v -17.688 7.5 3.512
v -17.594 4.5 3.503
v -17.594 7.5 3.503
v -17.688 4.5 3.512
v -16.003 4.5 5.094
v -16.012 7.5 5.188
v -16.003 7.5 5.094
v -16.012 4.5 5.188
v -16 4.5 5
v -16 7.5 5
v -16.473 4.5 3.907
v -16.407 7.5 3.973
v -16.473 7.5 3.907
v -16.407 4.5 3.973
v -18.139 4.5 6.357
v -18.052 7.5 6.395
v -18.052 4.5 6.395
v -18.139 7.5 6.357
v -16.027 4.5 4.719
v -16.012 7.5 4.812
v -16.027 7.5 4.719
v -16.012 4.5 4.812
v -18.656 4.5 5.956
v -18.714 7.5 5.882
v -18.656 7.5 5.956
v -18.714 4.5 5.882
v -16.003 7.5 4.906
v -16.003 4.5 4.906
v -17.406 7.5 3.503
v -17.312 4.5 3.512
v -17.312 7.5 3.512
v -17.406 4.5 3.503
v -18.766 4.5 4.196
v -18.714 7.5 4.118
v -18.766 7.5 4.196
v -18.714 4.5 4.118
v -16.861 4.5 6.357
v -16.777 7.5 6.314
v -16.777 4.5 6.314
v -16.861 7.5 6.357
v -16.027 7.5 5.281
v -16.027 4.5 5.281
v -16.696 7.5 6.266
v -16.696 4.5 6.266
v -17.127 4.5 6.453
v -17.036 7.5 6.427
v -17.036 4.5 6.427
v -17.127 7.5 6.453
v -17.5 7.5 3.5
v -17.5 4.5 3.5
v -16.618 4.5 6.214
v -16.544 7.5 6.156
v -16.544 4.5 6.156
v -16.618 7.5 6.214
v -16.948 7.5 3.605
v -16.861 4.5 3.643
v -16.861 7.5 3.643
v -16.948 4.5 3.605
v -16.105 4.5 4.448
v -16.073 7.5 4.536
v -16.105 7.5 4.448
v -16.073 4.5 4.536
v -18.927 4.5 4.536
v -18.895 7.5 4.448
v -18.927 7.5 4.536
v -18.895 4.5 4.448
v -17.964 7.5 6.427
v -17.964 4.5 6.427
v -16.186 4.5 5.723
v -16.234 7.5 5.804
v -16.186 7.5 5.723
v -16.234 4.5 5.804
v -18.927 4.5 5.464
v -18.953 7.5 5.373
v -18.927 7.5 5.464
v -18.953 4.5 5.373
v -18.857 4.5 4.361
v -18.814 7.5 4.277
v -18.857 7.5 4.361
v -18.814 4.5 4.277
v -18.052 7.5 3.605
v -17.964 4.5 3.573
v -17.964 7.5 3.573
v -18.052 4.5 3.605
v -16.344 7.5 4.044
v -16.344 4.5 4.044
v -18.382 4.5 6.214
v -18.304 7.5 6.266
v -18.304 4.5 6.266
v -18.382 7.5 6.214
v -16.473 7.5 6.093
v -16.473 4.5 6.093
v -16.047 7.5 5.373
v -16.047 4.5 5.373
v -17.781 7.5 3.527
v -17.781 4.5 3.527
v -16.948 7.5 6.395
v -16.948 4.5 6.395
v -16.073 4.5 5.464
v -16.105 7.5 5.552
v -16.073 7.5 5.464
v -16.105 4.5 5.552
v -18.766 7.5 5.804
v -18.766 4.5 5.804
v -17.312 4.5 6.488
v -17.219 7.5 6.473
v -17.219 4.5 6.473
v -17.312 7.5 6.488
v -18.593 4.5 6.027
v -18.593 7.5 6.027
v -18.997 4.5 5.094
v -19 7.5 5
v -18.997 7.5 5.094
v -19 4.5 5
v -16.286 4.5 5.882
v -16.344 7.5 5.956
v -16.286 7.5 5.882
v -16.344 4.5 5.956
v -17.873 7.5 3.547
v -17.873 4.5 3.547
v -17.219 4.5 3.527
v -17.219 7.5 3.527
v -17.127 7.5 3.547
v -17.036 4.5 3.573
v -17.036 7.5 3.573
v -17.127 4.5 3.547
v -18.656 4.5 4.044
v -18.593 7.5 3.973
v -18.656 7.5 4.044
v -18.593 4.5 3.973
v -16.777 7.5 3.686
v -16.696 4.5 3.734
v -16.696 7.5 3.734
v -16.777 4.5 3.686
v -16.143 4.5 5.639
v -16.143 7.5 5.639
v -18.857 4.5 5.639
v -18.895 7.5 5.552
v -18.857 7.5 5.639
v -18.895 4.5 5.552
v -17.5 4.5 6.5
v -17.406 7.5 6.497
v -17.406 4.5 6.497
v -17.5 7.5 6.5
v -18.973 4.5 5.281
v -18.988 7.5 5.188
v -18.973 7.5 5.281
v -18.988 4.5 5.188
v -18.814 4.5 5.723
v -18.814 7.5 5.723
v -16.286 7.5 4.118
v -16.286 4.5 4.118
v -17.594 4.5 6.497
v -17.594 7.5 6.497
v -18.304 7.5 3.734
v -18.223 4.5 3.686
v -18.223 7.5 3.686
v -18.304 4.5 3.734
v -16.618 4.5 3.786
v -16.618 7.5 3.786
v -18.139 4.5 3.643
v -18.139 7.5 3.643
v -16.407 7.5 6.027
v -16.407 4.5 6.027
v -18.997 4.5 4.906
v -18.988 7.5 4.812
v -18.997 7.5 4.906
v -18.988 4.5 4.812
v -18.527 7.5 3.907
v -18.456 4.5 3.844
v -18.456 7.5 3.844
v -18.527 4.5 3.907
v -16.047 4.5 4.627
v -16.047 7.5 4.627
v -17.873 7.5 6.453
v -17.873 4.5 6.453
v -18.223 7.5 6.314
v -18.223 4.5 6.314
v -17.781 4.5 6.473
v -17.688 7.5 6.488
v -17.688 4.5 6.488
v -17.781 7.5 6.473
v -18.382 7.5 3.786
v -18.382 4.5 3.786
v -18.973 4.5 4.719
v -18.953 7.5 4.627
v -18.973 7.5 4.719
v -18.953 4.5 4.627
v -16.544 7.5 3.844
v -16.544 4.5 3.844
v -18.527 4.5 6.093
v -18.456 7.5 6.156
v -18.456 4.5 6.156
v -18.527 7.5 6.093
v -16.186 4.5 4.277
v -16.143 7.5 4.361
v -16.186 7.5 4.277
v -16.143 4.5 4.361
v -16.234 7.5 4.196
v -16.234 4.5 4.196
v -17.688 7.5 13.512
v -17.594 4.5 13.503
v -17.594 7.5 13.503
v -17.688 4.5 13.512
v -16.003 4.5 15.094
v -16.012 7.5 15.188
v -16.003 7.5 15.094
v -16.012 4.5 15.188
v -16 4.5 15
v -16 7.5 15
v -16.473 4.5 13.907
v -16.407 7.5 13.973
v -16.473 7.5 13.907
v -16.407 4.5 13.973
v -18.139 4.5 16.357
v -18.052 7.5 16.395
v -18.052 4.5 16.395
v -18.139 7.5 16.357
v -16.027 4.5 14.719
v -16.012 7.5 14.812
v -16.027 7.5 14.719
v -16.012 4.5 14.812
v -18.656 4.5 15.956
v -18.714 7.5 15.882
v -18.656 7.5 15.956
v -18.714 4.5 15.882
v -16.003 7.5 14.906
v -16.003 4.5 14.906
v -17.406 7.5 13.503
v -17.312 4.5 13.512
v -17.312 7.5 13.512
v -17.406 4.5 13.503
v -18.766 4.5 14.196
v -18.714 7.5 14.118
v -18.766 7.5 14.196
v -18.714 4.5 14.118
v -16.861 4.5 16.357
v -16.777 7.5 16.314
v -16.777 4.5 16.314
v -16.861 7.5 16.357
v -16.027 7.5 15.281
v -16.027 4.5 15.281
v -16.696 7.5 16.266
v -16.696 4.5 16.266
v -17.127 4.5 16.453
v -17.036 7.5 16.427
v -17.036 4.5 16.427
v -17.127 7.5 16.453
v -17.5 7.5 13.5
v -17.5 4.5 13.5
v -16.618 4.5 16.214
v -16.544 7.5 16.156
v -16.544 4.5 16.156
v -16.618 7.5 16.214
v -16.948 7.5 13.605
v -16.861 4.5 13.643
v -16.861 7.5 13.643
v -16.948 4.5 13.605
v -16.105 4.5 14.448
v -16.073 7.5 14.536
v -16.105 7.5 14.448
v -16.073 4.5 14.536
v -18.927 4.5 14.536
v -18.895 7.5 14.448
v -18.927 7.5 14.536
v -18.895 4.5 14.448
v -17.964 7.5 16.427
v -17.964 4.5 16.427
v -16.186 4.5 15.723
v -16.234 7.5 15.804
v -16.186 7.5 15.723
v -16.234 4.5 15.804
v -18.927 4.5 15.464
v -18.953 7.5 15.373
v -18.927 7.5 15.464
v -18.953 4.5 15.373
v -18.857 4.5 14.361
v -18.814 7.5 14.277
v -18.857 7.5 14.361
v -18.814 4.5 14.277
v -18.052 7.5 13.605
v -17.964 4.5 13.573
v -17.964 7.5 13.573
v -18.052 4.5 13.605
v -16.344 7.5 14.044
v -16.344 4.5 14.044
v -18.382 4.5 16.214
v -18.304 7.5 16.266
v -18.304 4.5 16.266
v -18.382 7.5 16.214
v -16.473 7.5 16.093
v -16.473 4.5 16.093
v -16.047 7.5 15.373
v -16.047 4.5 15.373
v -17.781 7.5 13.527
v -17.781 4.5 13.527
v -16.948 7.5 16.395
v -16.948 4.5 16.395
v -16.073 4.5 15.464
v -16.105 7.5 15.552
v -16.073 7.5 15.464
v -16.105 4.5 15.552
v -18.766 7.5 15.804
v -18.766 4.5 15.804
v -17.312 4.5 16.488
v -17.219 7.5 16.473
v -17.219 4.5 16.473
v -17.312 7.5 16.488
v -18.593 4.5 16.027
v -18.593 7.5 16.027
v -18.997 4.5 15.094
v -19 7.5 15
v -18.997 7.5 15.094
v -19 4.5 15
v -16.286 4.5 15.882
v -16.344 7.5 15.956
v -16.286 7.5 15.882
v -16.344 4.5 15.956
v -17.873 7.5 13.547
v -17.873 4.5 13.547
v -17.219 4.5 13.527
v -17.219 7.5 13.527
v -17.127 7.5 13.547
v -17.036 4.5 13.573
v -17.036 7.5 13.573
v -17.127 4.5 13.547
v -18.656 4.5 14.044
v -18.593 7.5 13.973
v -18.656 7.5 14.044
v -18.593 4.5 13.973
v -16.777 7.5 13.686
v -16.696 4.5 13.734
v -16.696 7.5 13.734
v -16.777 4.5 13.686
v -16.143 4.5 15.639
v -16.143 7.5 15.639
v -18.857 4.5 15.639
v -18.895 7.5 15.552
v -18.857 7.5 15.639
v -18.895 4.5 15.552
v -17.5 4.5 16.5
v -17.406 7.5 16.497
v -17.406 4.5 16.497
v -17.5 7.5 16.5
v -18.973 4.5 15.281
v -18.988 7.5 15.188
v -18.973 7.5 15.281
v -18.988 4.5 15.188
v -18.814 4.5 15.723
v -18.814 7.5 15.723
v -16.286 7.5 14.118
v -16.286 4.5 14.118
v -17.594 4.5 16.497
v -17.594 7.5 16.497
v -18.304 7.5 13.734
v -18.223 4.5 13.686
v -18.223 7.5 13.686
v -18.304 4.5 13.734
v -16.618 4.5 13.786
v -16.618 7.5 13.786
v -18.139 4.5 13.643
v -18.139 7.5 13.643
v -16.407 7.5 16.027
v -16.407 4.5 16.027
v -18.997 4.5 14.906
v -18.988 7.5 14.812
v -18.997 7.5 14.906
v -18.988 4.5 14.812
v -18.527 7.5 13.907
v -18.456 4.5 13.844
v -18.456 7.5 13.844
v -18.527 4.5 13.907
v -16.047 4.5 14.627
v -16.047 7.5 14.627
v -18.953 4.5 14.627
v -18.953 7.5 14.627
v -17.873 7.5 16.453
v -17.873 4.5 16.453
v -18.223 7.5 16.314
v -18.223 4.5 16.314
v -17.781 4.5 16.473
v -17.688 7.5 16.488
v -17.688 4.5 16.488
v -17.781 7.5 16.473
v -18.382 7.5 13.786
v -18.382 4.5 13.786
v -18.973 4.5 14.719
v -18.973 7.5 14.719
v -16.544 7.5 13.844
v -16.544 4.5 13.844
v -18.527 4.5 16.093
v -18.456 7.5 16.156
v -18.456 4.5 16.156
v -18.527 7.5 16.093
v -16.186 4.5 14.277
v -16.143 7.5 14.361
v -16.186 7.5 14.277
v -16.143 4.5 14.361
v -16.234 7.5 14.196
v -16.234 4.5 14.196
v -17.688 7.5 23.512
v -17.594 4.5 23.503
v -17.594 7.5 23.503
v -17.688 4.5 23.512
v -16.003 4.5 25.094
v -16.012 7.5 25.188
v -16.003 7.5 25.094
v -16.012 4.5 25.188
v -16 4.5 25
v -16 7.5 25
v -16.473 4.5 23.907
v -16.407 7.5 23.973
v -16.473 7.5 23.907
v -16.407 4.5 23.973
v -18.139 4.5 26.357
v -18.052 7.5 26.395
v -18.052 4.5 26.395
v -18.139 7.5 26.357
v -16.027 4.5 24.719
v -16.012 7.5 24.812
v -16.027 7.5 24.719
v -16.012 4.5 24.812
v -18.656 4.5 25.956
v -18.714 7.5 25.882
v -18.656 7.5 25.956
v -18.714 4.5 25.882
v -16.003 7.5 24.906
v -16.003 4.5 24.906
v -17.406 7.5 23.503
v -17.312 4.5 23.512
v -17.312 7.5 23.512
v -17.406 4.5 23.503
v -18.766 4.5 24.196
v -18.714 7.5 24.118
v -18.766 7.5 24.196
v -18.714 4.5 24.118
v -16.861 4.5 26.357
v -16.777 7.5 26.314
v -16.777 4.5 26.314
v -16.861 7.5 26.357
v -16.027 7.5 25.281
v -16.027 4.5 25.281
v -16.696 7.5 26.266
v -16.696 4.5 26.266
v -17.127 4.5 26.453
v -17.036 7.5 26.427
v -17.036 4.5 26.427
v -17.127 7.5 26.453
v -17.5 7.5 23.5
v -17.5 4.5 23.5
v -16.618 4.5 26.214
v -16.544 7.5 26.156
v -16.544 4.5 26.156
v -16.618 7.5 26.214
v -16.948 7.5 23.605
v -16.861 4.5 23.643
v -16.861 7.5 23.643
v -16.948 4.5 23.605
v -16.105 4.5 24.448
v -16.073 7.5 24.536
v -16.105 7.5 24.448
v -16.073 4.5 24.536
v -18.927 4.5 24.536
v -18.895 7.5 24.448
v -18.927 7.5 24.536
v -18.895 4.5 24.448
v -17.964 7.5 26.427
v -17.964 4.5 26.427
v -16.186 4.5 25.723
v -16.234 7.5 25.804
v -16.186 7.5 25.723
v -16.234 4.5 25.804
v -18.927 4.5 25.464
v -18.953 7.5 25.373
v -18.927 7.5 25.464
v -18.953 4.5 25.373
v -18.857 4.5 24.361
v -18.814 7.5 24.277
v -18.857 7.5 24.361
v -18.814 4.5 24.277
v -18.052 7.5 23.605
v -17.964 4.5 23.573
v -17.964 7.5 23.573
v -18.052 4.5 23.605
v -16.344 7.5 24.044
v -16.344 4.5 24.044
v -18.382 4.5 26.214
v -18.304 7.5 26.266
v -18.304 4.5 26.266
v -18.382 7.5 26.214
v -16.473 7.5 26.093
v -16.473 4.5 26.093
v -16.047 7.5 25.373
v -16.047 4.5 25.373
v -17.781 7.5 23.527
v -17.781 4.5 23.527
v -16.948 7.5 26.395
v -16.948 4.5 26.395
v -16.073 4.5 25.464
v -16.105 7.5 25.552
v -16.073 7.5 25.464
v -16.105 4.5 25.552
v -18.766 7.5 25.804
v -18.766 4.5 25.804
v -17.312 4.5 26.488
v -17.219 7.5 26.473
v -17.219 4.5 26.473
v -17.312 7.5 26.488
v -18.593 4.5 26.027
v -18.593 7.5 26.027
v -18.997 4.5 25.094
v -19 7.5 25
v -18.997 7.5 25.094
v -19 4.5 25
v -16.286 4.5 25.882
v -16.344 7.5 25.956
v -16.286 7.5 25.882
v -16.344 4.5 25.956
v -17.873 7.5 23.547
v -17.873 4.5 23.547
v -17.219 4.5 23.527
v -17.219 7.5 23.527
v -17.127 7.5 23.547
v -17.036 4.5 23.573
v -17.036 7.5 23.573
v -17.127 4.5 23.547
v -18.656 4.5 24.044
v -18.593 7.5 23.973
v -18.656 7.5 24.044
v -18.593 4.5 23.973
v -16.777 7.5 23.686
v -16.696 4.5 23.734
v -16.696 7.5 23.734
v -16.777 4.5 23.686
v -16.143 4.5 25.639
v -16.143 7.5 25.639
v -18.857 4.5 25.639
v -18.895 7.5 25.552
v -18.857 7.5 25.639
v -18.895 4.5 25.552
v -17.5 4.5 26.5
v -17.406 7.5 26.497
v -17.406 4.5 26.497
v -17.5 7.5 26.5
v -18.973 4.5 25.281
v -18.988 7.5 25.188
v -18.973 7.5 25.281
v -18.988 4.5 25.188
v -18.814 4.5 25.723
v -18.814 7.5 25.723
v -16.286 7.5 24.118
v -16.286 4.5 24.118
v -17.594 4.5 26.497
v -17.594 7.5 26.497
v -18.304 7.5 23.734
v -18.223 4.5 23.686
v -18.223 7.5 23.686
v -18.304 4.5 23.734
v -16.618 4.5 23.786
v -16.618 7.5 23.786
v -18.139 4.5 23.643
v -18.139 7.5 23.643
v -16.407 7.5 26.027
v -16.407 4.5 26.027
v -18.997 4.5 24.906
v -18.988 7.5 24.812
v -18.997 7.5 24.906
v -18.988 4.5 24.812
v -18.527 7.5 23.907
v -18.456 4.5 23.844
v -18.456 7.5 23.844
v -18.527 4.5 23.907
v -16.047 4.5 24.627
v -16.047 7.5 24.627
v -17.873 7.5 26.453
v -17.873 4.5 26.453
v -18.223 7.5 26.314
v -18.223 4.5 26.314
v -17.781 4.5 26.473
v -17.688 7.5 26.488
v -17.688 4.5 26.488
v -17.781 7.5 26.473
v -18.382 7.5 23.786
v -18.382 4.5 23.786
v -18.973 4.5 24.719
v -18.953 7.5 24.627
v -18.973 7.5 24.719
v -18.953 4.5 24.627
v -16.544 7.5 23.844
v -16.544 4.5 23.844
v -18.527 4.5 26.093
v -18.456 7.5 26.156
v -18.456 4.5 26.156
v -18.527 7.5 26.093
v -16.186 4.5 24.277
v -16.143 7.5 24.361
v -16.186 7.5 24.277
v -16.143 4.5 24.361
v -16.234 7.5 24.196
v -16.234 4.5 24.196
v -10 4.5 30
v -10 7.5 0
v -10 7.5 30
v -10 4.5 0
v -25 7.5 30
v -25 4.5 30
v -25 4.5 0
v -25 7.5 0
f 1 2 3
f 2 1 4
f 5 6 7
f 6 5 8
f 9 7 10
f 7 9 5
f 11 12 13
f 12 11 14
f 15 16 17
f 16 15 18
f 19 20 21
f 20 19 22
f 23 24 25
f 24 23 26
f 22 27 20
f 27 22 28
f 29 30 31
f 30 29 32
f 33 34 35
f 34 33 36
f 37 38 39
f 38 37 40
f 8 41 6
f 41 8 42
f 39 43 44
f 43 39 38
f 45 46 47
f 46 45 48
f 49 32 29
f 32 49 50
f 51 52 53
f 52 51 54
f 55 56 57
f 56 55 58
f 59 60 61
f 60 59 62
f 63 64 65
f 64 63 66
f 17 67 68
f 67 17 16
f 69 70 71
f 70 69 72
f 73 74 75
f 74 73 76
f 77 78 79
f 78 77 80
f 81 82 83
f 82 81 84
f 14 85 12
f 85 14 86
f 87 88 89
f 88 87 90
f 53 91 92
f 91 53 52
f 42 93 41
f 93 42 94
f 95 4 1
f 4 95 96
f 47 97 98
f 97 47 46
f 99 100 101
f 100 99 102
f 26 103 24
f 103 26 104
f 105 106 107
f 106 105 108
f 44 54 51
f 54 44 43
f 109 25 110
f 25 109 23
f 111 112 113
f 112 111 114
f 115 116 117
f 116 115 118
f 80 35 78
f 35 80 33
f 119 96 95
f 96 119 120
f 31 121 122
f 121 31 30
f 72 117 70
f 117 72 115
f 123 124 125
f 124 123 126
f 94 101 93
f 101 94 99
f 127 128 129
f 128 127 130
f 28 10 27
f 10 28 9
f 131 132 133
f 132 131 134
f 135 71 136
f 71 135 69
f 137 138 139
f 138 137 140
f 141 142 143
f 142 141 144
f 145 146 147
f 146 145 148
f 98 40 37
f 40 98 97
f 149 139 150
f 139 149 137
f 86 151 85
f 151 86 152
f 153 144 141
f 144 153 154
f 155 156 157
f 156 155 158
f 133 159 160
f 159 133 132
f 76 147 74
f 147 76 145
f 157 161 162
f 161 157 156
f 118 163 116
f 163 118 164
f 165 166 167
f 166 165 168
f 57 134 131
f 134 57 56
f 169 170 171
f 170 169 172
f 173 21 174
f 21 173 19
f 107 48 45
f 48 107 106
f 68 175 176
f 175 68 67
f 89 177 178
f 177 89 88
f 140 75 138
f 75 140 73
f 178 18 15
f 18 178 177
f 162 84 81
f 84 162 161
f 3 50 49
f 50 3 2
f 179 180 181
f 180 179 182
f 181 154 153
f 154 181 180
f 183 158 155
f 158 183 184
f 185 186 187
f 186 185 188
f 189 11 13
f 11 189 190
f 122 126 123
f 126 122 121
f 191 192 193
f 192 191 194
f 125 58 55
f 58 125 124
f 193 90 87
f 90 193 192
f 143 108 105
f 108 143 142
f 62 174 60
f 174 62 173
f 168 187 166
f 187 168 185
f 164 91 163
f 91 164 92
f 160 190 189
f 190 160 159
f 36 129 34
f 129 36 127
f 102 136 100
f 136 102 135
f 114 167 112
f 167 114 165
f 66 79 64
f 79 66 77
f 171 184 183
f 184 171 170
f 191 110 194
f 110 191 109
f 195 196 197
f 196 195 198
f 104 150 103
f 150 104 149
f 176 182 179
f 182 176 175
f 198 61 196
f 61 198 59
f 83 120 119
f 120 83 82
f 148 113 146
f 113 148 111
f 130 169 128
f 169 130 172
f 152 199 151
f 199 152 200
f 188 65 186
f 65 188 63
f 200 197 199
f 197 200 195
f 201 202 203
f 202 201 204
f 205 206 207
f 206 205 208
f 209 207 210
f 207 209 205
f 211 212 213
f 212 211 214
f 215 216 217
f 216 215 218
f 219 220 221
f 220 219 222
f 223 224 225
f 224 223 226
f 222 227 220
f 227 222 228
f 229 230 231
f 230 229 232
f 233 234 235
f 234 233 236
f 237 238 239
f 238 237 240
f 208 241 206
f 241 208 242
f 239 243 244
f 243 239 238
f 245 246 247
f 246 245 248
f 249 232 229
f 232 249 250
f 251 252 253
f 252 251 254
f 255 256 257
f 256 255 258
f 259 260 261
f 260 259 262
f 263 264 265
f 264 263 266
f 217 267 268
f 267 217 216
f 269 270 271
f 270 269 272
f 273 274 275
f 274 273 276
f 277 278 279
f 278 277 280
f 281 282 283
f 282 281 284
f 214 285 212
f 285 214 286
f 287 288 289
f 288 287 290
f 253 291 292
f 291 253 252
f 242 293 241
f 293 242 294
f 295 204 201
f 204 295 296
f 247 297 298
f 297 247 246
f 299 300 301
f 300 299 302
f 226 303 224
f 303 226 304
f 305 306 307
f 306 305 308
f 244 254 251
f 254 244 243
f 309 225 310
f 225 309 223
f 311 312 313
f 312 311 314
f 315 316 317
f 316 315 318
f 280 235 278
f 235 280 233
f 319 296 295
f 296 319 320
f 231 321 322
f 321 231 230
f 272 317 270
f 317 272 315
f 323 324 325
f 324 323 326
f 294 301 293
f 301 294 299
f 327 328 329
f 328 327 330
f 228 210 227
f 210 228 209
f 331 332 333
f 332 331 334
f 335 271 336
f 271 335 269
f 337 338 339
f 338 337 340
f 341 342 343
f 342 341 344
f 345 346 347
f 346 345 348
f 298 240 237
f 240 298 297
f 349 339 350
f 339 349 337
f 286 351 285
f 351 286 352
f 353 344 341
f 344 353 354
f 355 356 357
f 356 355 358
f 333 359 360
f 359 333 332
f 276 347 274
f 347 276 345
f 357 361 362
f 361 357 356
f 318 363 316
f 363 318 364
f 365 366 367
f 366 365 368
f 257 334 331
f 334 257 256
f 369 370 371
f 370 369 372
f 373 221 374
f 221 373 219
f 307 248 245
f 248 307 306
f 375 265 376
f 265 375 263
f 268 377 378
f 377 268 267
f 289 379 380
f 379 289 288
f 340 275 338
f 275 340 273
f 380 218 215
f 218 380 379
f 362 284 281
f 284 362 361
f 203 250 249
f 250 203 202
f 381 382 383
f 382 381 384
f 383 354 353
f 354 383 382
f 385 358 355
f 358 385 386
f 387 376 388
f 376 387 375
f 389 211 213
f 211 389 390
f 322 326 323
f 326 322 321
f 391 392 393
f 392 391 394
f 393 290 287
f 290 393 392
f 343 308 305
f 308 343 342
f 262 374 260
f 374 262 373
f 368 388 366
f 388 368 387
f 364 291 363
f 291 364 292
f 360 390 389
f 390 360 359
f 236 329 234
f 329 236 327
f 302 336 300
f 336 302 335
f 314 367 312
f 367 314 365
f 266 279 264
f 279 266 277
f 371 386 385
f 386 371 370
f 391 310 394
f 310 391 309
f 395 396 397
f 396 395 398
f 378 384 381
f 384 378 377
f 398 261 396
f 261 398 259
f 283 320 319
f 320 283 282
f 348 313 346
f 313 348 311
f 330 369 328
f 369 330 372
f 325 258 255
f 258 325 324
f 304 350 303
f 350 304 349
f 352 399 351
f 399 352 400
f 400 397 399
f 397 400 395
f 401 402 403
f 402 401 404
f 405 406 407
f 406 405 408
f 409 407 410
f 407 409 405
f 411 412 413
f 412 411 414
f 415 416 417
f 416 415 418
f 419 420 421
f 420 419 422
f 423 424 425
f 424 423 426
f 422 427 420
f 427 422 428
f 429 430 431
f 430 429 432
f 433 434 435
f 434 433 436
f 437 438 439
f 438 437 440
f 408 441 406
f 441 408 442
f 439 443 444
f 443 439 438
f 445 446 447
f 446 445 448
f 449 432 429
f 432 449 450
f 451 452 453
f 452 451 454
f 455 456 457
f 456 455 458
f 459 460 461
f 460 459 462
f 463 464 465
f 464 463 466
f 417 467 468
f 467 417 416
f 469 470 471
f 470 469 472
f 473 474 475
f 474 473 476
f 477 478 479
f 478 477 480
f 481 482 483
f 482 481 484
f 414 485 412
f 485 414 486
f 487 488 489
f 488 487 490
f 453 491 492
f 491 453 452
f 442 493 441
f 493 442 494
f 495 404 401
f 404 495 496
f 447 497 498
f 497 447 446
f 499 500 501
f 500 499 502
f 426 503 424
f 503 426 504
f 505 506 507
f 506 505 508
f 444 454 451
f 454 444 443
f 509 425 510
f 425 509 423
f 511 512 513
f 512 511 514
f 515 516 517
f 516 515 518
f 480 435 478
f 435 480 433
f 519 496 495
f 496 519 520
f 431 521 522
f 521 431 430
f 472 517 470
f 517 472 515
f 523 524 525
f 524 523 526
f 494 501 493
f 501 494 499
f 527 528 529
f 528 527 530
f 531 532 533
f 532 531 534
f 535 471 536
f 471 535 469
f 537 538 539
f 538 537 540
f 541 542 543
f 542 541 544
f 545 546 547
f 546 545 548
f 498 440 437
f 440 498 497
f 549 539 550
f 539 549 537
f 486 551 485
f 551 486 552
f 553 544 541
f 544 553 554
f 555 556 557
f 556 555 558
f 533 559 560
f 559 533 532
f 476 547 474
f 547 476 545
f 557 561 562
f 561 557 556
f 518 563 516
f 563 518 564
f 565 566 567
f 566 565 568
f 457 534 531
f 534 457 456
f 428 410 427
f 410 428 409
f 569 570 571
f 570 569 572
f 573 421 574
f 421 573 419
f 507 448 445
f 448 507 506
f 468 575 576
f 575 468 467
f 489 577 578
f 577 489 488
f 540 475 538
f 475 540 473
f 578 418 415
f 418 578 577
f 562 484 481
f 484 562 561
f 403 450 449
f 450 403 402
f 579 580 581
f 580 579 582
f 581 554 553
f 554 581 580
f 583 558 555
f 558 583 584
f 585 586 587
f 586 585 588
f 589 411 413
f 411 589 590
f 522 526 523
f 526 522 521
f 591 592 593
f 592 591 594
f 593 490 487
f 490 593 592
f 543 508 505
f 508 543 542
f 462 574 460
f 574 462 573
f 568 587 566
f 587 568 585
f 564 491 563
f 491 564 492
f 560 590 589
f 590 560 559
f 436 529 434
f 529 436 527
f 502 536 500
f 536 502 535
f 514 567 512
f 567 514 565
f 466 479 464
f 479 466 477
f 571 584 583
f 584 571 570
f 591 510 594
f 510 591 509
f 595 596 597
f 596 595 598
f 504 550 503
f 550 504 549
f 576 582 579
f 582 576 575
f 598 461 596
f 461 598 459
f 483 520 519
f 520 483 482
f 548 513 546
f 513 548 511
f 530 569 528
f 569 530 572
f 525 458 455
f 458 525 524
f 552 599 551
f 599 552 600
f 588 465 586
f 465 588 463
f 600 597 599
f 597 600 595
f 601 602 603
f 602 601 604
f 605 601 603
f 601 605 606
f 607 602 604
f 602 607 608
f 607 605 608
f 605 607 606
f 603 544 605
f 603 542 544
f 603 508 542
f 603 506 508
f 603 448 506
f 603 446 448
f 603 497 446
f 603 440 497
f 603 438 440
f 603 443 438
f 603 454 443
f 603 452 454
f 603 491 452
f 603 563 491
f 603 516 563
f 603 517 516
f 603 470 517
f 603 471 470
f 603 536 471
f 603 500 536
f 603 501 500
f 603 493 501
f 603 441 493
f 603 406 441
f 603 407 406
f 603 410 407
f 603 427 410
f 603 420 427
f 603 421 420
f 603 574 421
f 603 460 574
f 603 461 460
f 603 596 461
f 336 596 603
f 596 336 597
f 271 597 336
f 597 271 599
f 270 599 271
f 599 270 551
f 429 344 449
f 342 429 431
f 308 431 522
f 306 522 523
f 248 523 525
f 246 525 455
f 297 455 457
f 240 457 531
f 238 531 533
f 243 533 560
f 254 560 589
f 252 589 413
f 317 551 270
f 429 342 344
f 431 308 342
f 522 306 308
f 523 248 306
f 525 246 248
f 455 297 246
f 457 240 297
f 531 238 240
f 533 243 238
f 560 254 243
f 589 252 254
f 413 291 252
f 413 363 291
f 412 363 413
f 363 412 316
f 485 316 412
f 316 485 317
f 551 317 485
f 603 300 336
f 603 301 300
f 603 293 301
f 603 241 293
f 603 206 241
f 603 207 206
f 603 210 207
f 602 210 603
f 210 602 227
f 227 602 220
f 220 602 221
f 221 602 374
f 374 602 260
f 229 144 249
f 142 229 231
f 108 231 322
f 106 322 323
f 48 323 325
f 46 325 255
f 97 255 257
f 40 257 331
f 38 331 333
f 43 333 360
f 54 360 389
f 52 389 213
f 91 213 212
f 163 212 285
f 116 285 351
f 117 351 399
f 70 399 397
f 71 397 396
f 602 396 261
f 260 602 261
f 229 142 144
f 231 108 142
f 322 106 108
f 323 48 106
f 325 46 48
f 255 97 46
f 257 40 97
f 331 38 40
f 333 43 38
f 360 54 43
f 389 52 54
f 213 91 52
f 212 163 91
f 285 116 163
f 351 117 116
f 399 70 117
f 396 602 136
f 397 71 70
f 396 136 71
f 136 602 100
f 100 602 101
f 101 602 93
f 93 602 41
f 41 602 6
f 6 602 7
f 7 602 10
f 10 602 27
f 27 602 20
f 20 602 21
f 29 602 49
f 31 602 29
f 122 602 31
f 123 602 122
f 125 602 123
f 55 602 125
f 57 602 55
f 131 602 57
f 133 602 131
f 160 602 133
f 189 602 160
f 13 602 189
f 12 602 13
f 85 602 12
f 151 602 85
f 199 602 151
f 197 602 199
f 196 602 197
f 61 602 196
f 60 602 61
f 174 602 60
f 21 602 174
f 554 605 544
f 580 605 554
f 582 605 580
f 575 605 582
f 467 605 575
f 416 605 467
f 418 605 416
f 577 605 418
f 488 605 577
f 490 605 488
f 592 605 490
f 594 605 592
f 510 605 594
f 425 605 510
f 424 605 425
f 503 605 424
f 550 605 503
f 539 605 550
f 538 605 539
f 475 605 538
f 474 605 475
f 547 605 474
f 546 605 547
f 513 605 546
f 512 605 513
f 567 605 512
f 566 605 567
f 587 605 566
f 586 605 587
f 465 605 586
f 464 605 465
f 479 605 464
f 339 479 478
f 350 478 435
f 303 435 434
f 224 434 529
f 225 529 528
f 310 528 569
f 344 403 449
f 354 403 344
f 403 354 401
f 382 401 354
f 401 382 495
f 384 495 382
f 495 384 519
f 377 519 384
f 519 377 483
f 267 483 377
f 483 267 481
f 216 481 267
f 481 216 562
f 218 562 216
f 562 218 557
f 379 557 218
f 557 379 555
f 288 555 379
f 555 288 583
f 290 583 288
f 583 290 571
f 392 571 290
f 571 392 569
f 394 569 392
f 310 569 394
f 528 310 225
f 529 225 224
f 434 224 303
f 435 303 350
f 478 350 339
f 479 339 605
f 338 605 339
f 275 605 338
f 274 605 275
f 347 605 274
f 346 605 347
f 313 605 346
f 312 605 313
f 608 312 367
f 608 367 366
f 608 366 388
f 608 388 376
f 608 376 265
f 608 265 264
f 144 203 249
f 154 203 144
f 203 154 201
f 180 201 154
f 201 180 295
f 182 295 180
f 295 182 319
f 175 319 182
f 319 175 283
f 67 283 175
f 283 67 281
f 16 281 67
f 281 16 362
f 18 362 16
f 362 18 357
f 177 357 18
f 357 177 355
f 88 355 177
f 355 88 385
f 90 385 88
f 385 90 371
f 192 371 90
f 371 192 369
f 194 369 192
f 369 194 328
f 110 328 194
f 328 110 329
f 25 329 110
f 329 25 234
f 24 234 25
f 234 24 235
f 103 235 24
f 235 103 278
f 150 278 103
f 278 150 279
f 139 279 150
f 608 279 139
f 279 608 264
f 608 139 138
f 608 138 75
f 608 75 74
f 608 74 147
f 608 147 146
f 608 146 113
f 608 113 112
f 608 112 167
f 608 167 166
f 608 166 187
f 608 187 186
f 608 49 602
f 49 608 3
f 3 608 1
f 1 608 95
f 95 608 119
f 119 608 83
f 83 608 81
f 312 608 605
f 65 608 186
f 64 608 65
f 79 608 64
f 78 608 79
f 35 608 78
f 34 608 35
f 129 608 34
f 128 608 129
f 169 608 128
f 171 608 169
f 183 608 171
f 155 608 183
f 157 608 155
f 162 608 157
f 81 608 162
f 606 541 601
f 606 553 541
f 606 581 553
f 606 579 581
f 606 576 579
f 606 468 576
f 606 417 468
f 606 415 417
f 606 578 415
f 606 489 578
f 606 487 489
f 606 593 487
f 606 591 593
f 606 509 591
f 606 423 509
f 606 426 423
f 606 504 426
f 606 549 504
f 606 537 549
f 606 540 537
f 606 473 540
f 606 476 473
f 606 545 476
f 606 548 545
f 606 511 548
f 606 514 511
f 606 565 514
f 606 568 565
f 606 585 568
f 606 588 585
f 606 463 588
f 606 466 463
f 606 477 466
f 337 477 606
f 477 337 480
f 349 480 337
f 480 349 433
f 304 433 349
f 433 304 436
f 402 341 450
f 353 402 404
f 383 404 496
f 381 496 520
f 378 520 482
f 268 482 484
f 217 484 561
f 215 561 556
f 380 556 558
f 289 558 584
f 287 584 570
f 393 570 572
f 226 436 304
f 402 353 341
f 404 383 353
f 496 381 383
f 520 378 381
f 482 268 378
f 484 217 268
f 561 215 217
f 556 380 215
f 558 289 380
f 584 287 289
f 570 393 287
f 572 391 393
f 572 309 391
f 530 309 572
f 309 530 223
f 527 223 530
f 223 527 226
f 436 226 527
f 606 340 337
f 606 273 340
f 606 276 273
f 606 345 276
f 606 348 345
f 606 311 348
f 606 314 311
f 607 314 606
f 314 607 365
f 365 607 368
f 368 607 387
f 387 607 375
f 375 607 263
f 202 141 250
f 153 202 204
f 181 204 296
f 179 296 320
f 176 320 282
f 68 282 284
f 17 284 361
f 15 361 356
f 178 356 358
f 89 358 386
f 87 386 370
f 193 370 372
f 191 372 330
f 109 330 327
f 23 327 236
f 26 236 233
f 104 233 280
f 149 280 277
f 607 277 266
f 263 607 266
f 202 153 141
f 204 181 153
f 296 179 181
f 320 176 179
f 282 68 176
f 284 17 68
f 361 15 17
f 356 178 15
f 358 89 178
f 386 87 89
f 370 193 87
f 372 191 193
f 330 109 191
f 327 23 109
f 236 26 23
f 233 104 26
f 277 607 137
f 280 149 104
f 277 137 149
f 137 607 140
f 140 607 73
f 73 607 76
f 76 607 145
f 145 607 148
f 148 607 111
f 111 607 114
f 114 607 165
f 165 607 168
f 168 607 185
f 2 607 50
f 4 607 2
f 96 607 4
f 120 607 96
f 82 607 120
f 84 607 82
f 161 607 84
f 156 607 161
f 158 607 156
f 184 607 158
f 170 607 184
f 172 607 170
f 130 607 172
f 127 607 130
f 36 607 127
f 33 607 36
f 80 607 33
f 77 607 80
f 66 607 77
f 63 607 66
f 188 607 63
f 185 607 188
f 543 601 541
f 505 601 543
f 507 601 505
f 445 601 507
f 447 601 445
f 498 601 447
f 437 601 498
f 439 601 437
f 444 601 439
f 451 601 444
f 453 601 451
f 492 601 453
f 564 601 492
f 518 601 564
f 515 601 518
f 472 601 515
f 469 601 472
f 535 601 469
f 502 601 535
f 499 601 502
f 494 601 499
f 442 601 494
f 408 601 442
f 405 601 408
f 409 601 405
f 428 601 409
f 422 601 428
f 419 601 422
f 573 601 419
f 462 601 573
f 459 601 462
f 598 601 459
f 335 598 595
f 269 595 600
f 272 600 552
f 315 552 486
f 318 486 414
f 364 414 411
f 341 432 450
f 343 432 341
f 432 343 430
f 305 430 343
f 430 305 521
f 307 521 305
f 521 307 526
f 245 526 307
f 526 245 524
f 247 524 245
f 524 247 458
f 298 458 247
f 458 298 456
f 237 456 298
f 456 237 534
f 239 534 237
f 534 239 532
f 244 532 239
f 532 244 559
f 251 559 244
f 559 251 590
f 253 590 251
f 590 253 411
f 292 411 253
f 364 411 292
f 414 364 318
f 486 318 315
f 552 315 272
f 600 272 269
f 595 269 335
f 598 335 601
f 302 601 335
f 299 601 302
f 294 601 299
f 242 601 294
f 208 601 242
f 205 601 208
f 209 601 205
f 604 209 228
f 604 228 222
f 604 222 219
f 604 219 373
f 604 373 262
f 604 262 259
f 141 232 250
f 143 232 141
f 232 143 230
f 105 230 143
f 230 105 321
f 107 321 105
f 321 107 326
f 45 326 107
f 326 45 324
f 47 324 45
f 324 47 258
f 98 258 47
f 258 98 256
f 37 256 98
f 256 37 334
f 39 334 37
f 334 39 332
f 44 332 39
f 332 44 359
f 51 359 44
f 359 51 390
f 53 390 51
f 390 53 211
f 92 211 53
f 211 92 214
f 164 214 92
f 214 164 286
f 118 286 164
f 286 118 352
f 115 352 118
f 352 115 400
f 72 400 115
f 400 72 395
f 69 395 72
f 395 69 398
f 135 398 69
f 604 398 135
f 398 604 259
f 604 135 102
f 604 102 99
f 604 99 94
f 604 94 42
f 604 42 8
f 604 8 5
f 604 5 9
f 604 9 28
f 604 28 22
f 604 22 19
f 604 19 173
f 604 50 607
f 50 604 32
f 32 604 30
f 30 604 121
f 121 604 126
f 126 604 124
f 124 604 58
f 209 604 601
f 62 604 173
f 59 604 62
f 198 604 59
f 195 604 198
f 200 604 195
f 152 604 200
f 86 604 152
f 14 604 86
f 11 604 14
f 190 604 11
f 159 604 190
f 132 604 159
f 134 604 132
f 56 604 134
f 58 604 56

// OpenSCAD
difference(){
	union(){
        
        translate([-25,4.5,0]){
            cube([15,3,30], center=false);
        }         


	}
	union() {

        translate([-17.5,8.5,5]){
            rotate([90,0,0]){
                cylinder(h=25, r=1.5, $fn=100, center=false);
            }
        }       
        translate([-17.5,8.5,15]){
            rotate([90,0,0]){
                cylinder(h=25, r=1.5, $fn=100, center=false);
            }
        }       
        translate([-17.5,8.5,25]){
            rotate([90,0,0]){
                cylinder(h=25, r=1.5, $fn=100, center=false);
            }
        }     
	}
}
